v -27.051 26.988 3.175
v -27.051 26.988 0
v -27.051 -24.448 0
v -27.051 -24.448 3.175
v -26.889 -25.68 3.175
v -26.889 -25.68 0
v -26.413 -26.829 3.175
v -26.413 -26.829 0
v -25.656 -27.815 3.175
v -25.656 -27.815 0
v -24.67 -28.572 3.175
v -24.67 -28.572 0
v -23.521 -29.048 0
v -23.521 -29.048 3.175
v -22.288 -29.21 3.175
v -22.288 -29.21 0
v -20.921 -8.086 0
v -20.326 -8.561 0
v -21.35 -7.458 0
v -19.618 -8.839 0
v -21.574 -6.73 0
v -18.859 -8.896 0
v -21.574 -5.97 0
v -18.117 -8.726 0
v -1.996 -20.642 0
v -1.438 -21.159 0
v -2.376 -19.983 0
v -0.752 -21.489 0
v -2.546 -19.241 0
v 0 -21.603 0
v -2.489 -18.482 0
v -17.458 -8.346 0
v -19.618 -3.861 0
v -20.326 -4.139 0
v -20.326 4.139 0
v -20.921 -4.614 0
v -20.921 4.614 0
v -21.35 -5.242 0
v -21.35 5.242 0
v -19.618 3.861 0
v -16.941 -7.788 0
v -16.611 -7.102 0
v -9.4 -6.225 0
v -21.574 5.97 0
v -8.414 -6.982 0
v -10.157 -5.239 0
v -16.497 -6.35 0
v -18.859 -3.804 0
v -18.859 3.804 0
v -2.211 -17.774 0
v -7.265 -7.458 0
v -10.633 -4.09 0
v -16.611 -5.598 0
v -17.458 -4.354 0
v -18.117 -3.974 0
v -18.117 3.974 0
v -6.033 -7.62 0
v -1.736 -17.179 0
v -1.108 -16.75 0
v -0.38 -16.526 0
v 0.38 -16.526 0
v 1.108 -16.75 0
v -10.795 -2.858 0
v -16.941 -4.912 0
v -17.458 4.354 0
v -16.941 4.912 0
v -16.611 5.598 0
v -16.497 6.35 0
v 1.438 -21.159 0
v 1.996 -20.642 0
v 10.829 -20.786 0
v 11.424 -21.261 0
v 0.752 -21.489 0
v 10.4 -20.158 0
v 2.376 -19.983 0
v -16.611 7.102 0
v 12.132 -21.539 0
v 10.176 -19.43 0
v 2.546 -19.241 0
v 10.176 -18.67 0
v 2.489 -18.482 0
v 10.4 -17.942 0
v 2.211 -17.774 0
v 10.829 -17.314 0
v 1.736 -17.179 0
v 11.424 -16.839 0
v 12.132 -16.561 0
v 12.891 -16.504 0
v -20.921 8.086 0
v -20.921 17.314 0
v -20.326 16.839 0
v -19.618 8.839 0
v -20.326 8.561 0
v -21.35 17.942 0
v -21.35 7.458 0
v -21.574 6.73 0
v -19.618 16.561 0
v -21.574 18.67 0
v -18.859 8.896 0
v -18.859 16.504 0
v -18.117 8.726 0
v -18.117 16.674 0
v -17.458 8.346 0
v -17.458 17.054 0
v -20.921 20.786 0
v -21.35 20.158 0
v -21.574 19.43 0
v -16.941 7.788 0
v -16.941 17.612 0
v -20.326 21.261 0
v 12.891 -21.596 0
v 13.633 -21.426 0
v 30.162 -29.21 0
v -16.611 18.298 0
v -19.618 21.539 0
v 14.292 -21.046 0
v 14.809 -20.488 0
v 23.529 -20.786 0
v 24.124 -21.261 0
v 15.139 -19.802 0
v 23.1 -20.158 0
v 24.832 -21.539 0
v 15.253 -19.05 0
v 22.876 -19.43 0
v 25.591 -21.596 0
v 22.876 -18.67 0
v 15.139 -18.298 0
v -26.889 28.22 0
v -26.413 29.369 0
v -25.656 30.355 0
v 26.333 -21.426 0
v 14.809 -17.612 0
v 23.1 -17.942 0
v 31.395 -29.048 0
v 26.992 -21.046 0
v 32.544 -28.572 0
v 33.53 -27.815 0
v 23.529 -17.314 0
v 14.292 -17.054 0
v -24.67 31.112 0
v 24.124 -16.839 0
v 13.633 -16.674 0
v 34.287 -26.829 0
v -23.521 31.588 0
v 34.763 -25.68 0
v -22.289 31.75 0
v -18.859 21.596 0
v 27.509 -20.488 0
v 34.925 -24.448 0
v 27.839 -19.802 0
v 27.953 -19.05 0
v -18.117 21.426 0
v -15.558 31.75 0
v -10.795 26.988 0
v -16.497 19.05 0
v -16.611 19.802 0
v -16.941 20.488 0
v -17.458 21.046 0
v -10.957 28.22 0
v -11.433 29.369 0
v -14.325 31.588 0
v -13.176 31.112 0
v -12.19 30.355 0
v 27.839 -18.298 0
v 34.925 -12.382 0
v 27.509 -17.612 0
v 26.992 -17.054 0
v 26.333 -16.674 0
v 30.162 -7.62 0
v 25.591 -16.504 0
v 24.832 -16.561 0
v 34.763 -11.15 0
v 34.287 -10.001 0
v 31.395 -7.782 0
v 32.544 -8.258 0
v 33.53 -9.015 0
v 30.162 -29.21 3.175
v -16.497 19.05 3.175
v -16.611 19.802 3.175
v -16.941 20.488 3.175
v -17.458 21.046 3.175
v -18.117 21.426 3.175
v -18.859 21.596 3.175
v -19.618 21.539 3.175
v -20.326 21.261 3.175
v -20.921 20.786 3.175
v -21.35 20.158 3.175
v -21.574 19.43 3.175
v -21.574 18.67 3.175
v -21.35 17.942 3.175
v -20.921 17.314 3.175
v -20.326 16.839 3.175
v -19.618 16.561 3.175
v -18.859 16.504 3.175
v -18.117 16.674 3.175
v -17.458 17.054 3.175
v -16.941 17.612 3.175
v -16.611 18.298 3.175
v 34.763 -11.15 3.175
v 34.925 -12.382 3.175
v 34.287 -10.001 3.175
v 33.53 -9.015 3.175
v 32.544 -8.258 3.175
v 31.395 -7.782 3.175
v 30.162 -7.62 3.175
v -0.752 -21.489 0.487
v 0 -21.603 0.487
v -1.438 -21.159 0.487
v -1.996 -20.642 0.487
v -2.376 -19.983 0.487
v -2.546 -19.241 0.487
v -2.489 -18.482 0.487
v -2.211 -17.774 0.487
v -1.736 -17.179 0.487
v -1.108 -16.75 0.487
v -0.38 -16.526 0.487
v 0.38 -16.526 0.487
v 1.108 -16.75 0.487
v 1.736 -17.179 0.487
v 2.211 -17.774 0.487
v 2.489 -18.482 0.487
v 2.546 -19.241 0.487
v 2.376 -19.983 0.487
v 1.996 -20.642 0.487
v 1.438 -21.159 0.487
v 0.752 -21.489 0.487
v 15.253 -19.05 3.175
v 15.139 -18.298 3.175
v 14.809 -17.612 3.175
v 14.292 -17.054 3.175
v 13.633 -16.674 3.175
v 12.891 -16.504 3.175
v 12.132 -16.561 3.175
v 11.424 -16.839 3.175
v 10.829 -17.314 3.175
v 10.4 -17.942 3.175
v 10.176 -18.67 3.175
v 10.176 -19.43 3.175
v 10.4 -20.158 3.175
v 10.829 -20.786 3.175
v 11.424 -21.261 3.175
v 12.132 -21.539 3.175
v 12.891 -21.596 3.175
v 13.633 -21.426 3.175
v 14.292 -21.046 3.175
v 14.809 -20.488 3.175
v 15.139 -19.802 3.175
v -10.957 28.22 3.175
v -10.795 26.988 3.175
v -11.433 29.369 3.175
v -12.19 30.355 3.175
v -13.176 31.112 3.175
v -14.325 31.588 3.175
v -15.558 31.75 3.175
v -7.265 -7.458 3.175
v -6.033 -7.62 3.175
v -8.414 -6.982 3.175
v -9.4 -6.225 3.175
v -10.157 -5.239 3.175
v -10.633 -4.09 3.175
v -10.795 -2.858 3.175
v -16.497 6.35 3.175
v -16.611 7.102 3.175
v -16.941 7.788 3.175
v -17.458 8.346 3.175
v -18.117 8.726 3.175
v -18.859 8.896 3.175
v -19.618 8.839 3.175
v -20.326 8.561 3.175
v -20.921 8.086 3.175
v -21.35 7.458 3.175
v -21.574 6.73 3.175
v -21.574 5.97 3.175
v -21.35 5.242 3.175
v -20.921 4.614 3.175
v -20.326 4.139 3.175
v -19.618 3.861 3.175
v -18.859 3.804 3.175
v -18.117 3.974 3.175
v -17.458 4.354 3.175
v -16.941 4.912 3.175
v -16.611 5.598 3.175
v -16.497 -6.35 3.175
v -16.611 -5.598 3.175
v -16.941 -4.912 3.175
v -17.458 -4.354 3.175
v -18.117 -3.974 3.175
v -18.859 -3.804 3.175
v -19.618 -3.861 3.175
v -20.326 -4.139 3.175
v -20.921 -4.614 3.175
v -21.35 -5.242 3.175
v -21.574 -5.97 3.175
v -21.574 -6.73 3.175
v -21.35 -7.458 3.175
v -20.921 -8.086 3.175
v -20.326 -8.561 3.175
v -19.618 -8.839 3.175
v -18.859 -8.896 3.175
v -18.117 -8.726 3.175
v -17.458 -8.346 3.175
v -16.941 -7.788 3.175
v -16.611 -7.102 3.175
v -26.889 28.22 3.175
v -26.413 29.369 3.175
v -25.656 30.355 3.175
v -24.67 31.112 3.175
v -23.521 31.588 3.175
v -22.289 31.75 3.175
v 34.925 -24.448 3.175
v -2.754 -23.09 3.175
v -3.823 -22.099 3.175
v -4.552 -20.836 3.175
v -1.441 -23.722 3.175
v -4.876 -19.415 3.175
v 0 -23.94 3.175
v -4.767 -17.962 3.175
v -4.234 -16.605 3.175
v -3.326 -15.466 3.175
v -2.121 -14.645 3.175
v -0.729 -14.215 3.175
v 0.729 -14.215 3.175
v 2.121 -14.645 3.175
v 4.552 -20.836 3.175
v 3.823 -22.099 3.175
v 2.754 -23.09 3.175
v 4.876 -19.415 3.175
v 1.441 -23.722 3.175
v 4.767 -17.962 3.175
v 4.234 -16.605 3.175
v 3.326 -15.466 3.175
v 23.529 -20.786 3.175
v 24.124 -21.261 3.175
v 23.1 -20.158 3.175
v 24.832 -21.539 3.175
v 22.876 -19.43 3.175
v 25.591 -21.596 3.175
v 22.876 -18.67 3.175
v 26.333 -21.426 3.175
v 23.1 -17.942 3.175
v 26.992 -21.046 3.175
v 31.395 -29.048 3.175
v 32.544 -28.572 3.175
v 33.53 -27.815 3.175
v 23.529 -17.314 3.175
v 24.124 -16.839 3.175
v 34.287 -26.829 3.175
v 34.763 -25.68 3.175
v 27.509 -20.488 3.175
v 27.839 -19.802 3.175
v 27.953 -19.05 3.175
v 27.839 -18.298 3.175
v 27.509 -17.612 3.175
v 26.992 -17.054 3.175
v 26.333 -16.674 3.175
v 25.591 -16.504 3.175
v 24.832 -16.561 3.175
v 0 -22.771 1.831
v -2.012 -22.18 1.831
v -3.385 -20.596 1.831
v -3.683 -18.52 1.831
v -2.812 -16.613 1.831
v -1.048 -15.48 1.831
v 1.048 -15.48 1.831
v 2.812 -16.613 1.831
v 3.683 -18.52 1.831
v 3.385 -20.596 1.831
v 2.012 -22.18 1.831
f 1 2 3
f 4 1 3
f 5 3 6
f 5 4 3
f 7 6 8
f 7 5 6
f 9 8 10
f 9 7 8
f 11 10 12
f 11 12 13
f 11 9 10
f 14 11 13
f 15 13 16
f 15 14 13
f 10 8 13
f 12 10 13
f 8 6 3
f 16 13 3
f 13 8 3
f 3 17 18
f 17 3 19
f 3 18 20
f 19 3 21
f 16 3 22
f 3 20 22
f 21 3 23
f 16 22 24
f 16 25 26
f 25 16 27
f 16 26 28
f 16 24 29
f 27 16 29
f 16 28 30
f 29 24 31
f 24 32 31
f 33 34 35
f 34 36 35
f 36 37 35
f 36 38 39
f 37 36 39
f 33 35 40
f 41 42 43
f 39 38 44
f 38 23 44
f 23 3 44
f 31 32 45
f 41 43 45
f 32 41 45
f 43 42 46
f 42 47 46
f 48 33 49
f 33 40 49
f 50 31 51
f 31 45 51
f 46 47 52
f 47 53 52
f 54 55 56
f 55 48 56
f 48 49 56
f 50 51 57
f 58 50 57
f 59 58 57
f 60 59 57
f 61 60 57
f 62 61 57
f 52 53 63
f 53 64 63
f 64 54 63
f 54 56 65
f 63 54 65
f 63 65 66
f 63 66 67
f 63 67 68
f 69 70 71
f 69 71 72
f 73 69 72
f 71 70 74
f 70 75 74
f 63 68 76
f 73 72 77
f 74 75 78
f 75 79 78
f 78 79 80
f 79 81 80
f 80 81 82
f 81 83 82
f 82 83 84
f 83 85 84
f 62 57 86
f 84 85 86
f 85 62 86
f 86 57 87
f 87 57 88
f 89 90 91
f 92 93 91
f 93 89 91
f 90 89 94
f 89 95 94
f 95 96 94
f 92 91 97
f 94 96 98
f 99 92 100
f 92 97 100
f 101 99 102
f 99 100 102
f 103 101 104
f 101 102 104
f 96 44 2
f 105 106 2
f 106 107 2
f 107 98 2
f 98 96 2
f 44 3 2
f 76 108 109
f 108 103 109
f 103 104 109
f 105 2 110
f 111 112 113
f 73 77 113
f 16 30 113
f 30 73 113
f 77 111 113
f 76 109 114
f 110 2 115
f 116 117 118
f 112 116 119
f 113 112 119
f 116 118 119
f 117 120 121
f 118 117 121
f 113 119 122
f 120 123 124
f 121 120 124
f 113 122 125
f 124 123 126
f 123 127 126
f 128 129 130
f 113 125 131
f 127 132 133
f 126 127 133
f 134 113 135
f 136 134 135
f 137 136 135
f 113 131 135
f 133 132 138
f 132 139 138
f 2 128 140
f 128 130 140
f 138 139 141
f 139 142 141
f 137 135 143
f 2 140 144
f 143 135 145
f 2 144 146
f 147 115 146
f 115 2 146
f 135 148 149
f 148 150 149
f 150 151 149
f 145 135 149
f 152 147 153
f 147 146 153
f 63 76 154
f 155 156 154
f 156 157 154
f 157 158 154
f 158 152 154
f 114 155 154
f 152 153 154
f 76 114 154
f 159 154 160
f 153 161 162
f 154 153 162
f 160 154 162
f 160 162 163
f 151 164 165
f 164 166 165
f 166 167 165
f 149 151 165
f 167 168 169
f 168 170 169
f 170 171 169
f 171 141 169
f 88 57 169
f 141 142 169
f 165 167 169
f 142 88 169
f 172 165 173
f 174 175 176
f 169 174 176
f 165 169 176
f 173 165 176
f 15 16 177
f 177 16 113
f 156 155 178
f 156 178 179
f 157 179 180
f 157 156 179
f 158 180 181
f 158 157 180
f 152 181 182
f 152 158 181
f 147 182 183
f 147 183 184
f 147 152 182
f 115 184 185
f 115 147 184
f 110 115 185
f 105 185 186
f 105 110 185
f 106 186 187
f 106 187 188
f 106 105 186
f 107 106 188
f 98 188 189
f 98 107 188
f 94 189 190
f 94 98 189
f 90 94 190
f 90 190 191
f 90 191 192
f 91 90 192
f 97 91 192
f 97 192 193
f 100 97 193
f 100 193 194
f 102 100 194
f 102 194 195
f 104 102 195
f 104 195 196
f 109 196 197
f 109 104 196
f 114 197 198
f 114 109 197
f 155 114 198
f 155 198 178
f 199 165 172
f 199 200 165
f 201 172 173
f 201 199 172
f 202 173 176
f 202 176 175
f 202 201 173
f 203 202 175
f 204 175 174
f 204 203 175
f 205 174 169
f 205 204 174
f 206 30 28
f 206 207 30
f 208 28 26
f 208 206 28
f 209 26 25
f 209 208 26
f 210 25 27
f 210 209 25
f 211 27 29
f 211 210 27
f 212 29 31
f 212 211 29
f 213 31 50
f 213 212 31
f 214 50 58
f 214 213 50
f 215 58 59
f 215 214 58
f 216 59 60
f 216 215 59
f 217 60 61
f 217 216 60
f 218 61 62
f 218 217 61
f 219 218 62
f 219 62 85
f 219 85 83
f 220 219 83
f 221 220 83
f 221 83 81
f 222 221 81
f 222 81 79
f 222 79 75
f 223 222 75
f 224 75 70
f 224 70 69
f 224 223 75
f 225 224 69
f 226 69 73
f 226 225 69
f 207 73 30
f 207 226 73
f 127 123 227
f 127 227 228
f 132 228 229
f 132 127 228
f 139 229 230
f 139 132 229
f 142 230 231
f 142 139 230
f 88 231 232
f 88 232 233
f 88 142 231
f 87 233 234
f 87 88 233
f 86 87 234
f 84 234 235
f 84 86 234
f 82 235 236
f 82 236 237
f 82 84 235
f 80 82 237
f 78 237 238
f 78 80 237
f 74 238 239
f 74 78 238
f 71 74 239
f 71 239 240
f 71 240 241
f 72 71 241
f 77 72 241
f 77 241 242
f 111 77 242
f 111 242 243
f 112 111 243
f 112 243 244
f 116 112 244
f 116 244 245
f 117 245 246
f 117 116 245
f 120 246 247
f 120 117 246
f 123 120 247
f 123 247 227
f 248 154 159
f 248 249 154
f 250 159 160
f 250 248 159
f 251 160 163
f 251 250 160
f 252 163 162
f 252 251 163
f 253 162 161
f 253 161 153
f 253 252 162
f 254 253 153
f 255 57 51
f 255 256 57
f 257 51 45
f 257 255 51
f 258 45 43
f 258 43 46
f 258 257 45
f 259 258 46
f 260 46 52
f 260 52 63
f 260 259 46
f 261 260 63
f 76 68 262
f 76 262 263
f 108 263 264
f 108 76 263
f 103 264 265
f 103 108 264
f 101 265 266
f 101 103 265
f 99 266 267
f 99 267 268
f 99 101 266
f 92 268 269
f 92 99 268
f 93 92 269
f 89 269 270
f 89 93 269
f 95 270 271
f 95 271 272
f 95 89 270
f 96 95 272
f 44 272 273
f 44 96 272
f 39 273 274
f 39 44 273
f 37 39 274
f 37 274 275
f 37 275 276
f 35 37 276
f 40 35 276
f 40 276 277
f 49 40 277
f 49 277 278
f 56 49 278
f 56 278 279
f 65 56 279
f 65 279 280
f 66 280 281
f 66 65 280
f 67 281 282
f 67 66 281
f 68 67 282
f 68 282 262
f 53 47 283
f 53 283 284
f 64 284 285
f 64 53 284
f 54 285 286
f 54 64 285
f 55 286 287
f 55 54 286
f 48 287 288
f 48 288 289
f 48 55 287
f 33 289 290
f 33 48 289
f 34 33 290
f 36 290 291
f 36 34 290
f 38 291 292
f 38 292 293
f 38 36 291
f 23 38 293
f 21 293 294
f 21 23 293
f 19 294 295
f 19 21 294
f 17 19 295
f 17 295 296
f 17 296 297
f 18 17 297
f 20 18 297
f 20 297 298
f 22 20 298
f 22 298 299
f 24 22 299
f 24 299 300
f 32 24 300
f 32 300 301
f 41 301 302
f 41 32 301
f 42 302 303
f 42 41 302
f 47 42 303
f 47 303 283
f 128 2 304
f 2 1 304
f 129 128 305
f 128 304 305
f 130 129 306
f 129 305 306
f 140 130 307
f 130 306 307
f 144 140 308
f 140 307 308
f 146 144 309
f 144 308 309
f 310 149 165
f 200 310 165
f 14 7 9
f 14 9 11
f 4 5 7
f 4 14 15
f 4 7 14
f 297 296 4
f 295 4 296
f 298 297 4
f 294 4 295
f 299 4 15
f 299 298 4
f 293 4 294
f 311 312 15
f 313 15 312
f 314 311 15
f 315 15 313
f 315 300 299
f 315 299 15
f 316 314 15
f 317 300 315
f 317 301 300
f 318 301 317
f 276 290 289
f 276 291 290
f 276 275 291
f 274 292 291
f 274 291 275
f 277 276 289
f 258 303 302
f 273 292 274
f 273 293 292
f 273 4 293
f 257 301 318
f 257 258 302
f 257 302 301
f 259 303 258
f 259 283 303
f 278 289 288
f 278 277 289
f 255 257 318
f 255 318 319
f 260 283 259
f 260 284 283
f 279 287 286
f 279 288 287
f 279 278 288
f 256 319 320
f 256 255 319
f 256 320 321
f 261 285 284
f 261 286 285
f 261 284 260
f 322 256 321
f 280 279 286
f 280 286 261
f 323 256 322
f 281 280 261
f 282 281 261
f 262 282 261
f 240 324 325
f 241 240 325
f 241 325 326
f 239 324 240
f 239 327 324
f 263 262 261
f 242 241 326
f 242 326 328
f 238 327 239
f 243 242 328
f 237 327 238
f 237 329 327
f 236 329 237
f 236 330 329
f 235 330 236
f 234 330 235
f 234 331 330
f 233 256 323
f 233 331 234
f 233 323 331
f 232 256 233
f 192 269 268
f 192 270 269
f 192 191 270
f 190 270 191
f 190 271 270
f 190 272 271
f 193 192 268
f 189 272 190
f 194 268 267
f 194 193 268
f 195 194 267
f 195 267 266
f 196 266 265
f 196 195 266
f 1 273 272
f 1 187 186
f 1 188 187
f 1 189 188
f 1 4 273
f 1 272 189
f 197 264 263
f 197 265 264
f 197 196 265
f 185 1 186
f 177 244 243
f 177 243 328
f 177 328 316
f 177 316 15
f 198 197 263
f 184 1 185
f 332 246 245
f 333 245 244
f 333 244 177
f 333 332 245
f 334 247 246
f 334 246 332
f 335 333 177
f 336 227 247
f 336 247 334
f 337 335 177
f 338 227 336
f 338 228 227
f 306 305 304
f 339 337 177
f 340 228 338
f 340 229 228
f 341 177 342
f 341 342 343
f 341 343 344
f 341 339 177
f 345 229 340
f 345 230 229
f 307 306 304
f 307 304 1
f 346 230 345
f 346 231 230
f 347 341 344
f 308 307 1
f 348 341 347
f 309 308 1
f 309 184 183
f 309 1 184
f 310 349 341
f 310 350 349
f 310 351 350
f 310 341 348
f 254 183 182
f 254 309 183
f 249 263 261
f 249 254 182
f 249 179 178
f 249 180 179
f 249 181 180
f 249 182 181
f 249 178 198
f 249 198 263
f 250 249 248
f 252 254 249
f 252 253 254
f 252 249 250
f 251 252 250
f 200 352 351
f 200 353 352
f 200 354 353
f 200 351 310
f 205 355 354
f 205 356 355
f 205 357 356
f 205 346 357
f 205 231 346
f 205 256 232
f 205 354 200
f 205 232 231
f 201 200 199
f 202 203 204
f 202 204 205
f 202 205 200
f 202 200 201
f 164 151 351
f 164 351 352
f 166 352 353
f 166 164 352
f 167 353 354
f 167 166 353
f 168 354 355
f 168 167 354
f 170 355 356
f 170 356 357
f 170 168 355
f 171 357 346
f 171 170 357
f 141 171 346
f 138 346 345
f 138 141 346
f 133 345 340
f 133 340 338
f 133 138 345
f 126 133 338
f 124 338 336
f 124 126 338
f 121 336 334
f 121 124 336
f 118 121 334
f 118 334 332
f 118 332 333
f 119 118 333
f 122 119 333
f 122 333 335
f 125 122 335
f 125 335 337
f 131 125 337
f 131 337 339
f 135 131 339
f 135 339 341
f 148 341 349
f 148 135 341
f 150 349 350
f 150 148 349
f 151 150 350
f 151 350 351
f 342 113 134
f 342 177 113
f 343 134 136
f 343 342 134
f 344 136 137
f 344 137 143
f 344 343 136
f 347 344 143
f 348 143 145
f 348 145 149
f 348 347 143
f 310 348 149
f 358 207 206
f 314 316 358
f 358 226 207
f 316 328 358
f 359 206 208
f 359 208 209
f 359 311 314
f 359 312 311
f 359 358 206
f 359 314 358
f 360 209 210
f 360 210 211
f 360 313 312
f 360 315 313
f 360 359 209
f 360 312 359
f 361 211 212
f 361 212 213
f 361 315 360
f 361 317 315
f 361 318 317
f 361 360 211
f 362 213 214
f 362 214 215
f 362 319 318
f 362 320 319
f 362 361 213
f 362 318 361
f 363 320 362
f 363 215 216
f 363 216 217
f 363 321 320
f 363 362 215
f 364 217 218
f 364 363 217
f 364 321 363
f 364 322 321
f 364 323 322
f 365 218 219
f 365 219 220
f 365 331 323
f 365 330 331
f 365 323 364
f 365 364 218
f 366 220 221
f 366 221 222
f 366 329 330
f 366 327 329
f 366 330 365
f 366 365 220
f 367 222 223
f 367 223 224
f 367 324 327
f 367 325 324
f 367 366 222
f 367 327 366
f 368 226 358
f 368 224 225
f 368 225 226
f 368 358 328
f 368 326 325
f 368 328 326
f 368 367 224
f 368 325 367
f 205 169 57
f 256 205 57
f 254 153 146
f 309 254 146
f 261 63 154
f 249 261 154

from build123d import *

# Parameters (mm, degrees)
SKETCH1_R           = 2.5527
BOSS_EXTRUDE1_DEPTH = 3.175
FILLET1_R           = 4.7625


with BuildPart() as part:
    # Sketch1 → Boss-Extrude1 (new body)
    with BuildSketch(Plane.XY):
        Polygon((-27.051, 31.75), (-27.051, -29.21), (34.925, -29.21), (34.925, -7.62), (-10.795, -7.62), (-10.795, 31.75), align=None)
        with Locations((-19.05, -19.05)):
            Circle(SKETCH1_R, mode=Mode.SUBTRACT)
        with Locations((-19.05, -6.35)):
            Circle(SKETCH1_R, mode=Mode.SUBTRACT)
        with Locations((12.7, -19.05)):
            Circle(SKETCH1_R, mode=Mode.SUBTRACT)
        with Locations((25.4, -19.05)):
            Circle(SKETCH1_R, mode=Mode.SUBTRACT)
        with Locations((-19.05, 6.35)):
            Circle(SKETCH1_R, mode=Mode.SUBTRACT)
        with Locations((-19.05, 19.05)):
            Circle(SKETCH1_R, mode=Mode.SUBTRACT)
        with Locations((-19.05, -19.05)):
            Circle(SKETCH1_R)
    extrude(amount=BOSS_EXTRUDE1_DEPTH)

    # Fillet1
    fillet1_edges = [part.edges().sort_by_distance(p)[0] for p in [
        (-27.051, 31.75, 1.5875),
        (-10.795, 31.75, 1.5875),
        (-10.795, -7.62, 1.5875),
        (34.925, -7.62, 1.5875),
        (34.925, -29.21, 1.5875),
        (-27.051, -29.21, 1.5875),
    ]]
    fillet(fillet1_edges, radius=FILLET1_R)

    # Sketch2 → CSK for #10 Flat Head Machine Screw1 (revolve, cut)
    with BuildSketch(Plane(origin=(0, -19.05, 3.175), x_dir=(0, -1, 0), z_dir=(1, 0, 0))):
        Polygon((0, 0), (0, 3.175), (2.5527, 3.175), (2.5527, 2.688180894), (4.8895, 0), align=None)
    revolve(axis=Axis((0, -19.05, 9.525), (0, 0, -1)), mode=Mode.SUBTRACT)


solid = part.part
